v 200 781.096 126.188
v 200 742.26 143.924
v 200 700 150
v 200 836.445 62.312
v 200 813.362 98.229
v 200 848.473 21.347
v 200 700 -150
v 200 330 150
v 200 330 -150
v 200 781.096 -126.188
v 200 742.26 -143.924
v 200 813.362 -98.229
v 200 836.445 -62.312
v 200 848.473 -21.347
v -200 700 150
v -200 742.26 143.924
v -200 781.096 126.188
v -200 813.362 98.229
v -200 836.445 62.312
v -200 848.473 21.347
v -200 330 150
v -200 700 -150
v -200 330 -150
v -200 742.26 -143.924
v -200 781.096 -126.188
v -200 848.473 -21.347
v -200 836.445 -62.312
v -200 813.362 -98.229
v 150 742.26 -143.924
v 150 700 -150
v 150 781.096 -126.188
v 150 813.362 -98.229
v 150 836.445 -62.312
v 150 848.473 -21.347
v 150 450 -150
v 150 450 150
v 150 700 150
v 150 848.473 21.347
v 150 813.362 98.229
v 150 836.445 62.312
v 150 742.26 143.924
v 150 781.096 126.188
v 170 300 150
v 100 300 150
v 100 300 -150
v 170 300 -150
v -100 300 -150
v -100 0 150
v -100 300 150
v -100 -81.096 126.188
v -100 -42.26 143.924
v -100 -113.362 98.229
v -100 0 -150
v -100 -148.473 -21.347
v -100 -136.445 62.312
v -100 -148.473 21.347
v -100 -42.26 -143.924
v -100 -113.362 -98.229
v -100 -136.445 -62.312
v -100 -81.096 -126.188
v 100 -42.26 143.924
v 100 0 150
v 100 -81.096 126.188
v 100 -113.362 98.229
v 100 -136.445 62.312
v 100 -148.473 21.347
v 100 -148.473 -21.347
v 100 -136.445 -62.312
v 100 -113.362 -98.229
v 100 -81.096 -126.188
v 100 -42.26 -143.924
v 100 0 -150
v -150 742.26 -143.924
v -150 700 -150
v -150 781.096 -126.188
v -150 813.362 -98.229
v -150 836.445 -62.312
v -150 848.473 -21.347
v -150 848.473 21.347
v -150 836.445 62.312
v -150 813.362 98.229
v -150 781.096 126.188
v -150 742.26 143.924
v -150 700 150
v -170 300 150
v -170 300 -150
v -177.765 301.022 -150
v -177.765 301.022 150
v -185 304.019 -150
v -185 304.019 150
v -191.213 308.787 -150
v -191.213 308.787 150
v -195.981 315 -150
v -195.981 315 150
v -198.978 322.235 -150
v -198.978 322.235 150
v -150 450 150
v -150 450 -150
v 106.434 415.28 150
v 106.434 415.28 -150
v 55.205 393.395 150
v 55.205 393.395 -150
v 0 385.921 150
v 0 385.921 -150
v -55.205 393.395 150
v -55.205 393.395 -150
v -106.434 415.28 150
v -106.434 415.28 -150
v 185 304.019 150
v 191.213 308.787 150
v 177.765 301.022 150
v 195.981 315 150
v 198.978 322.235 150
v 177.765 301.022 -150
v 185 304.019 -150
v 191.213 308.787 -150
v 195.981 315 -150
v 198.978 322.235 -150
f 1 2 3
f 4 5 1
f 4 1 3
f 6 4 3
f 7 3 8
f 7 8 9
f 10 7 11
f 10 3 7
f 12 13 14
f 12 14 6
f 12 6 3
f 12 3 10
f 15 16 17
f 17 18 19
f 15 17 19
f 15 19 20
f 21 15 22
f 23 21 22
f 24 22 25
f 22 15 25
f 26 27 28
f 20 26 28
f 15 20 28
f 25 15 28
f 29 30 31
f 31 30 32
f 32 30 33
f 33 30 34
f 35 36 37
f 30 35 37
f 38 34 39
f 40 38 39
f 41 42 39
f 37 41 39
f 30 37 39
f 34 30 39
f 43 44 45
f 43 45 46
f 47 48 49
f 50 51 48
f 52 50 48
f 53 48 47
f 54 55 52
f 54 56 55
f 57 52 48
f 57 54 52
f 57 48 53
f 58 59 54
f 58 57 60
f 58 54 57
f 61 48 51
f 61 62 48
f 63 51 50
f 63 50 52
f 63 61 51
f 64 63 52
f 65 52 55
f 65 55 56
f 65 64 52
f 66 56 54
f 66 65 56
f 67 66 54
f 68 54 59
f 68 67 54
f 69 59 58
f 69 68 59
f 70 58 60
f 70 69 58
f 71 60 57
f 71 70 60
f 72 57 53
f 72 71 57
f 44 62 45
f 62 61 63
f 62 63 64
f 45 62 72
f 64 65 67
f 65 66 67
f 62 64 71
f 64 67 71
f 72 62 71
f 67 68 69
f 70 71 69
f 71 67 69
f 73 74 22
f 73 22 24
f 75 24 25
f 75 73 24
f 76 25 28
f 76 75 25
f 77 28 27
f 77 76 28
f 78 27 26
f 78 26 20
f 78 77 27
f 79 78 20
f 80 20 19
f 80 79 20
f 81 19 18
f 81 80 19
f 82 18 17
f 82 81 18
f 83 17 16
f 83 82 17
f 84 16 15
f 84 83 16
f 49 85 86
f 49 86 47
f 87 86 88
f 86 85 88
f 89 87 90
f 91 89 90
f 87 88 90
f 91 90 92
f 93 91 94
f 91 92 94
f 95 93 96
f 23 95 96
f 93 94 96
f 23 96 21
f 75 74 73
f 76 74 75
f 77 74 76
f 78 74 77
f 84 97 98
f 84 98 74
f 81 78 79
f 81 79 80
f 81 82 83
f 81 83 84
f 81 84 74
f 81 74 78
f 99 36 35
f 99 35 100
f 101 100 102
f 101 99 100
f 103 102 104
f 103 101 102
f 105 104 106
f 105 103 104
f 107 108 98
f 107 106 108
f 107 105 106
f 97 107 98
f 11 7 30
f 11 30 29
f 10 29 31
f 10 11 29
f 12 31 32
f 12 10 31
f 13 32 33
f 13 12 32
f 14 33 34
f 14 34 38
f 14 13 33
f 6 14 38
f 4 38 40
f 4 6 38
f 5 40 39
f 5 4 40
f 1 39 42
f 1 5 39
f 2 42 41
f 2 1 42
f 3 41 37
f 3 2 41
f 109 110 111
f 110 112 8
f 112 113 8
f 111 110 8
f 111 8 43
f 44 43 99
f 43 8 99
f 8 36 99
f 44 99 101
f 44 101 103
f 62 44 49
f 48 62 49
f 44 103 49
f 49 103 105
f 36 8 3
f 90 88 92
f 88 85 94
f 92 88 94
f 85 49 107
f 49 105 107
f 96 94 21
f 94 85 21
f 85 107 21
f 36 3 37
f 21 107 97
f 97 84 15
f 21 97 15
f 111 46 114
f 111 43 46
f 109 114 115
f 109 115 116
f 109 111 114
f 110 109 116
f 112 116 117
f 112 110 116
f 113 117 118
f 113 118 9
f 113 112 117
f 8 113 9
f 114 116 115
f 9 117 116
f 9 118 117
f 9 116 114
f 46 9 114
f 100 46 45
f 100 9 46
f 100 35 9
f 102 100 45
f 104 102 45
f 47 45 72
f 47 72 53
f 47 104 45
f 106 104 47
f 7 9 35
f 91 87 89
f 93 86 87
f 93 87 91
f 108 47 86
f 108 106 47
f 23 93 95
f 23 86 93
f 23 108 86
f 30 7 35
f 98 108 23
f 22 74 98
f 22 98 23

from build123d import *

# Parameters (mm, degrees)
SKETCH_1_R          = 150
EXTRUDE_1_DEPTH     = 100
SKETCH_2_W          = 200
SKETCH_2_H          = 300
EXTRUDE_2_DEPTH     = 300
EXTRUDE_4_DEPTH     = 150
SKETCH_6_R          = 150
EXTRUDE_5_DEPTH     = 200
SKETCH_7_W          = 300
SKETCH_7_H          = 800
CUT_EXTRUDE_1_DEPTH = 200
FILLET_1_R          = 30
FILLET_2_R          = 30
CUT_EXTRUDE_3_DEPTH = 213.5


with BuildPart() as part:
    # 草图1 → 凸台-拉伸1 (new, symmetric)
    with BuildSketch(Plane(origin=(0, 0, 0), x_dir=(0, 0, -1), z_dir=(1, 0, 0))):
        Circle(SKETCH_1_R)
    extrude(amount=EXTRUDE_1_DEPTH, both=True)

    # 草图2 → 凸台-拉伸2 (add)
    with BuildSketch(Plane(origin=(0, 0, 0), x_dir=(1, 0, 0), z_dir=(0, 1, 0))):
        Rectangle(SKETCH_2_W, SKETCH_2_H)
    extrude(amount=EXTRUDE_2_DEPTH)

    # 草图5 → 凸台-拉伸4 (add, symmetric)
    with BuildSketch(Plane.XY):
        Polygon((-200, 300), (-200, 700), (0, 700), (200, 700), (200, 300), (0, 300), align=None)
    extrude(amount=EXTRUDE_4_DEPTH, both=True)

    # 草图6 → 凸台-拉伸5 (add, symmetric)
    with BuildSketch(Plane(origin=(0, 0, 0), x_dir=(0, 0, -1), z_dir=(1, 0, 0))):
        with Locations((0, 700)):
            Circle(SKETCH_6_R)
    extrude(amount=EXTRUDE_5_DEPTH, both=True)

    # 草图7 → 切除-拉伸1 (cut, symmetric)
    with BuildSketch(Plane.XY):
        with Locations((0, 850)):
            Rectangle(SKETCH_7_W, SKETCH_7_H)
    extrude(amount=CUT_EXTRUDE_1_DEPTH, both=True, mode=Mode.SUBTRACT)

    # 圆角1
    fillet_1_edges = [part.edges().sort_by_distance(p)[0] for p in [
        (-200, 300, 0),
    ]]
    fillet(fillet_1_edges, radius=FILLET_1_R)

    # 圆角2
    fillet_2_edges = [part.edges().sort_by_distance(p)[0] for p in [
        (200, 300, 0),
    ]]
    fillet(fillet_2_edges, radius=FILLET_2_R)

    # 草图9 → 切除-拉伸3 (cut, symmetric)
    with BuildSketch(Plane.XY):
        with BuildLine():
            Line((-150, 450), (150, 450))
            ThreePointArc((150, 450), (0, 385.920784964), (-150, 450))
        make_face()
    extrude(amount=CUT_EXTRUDE_3_DEPTH, both=True, mode=Mode.SUBTRACT)


solid = part.part
